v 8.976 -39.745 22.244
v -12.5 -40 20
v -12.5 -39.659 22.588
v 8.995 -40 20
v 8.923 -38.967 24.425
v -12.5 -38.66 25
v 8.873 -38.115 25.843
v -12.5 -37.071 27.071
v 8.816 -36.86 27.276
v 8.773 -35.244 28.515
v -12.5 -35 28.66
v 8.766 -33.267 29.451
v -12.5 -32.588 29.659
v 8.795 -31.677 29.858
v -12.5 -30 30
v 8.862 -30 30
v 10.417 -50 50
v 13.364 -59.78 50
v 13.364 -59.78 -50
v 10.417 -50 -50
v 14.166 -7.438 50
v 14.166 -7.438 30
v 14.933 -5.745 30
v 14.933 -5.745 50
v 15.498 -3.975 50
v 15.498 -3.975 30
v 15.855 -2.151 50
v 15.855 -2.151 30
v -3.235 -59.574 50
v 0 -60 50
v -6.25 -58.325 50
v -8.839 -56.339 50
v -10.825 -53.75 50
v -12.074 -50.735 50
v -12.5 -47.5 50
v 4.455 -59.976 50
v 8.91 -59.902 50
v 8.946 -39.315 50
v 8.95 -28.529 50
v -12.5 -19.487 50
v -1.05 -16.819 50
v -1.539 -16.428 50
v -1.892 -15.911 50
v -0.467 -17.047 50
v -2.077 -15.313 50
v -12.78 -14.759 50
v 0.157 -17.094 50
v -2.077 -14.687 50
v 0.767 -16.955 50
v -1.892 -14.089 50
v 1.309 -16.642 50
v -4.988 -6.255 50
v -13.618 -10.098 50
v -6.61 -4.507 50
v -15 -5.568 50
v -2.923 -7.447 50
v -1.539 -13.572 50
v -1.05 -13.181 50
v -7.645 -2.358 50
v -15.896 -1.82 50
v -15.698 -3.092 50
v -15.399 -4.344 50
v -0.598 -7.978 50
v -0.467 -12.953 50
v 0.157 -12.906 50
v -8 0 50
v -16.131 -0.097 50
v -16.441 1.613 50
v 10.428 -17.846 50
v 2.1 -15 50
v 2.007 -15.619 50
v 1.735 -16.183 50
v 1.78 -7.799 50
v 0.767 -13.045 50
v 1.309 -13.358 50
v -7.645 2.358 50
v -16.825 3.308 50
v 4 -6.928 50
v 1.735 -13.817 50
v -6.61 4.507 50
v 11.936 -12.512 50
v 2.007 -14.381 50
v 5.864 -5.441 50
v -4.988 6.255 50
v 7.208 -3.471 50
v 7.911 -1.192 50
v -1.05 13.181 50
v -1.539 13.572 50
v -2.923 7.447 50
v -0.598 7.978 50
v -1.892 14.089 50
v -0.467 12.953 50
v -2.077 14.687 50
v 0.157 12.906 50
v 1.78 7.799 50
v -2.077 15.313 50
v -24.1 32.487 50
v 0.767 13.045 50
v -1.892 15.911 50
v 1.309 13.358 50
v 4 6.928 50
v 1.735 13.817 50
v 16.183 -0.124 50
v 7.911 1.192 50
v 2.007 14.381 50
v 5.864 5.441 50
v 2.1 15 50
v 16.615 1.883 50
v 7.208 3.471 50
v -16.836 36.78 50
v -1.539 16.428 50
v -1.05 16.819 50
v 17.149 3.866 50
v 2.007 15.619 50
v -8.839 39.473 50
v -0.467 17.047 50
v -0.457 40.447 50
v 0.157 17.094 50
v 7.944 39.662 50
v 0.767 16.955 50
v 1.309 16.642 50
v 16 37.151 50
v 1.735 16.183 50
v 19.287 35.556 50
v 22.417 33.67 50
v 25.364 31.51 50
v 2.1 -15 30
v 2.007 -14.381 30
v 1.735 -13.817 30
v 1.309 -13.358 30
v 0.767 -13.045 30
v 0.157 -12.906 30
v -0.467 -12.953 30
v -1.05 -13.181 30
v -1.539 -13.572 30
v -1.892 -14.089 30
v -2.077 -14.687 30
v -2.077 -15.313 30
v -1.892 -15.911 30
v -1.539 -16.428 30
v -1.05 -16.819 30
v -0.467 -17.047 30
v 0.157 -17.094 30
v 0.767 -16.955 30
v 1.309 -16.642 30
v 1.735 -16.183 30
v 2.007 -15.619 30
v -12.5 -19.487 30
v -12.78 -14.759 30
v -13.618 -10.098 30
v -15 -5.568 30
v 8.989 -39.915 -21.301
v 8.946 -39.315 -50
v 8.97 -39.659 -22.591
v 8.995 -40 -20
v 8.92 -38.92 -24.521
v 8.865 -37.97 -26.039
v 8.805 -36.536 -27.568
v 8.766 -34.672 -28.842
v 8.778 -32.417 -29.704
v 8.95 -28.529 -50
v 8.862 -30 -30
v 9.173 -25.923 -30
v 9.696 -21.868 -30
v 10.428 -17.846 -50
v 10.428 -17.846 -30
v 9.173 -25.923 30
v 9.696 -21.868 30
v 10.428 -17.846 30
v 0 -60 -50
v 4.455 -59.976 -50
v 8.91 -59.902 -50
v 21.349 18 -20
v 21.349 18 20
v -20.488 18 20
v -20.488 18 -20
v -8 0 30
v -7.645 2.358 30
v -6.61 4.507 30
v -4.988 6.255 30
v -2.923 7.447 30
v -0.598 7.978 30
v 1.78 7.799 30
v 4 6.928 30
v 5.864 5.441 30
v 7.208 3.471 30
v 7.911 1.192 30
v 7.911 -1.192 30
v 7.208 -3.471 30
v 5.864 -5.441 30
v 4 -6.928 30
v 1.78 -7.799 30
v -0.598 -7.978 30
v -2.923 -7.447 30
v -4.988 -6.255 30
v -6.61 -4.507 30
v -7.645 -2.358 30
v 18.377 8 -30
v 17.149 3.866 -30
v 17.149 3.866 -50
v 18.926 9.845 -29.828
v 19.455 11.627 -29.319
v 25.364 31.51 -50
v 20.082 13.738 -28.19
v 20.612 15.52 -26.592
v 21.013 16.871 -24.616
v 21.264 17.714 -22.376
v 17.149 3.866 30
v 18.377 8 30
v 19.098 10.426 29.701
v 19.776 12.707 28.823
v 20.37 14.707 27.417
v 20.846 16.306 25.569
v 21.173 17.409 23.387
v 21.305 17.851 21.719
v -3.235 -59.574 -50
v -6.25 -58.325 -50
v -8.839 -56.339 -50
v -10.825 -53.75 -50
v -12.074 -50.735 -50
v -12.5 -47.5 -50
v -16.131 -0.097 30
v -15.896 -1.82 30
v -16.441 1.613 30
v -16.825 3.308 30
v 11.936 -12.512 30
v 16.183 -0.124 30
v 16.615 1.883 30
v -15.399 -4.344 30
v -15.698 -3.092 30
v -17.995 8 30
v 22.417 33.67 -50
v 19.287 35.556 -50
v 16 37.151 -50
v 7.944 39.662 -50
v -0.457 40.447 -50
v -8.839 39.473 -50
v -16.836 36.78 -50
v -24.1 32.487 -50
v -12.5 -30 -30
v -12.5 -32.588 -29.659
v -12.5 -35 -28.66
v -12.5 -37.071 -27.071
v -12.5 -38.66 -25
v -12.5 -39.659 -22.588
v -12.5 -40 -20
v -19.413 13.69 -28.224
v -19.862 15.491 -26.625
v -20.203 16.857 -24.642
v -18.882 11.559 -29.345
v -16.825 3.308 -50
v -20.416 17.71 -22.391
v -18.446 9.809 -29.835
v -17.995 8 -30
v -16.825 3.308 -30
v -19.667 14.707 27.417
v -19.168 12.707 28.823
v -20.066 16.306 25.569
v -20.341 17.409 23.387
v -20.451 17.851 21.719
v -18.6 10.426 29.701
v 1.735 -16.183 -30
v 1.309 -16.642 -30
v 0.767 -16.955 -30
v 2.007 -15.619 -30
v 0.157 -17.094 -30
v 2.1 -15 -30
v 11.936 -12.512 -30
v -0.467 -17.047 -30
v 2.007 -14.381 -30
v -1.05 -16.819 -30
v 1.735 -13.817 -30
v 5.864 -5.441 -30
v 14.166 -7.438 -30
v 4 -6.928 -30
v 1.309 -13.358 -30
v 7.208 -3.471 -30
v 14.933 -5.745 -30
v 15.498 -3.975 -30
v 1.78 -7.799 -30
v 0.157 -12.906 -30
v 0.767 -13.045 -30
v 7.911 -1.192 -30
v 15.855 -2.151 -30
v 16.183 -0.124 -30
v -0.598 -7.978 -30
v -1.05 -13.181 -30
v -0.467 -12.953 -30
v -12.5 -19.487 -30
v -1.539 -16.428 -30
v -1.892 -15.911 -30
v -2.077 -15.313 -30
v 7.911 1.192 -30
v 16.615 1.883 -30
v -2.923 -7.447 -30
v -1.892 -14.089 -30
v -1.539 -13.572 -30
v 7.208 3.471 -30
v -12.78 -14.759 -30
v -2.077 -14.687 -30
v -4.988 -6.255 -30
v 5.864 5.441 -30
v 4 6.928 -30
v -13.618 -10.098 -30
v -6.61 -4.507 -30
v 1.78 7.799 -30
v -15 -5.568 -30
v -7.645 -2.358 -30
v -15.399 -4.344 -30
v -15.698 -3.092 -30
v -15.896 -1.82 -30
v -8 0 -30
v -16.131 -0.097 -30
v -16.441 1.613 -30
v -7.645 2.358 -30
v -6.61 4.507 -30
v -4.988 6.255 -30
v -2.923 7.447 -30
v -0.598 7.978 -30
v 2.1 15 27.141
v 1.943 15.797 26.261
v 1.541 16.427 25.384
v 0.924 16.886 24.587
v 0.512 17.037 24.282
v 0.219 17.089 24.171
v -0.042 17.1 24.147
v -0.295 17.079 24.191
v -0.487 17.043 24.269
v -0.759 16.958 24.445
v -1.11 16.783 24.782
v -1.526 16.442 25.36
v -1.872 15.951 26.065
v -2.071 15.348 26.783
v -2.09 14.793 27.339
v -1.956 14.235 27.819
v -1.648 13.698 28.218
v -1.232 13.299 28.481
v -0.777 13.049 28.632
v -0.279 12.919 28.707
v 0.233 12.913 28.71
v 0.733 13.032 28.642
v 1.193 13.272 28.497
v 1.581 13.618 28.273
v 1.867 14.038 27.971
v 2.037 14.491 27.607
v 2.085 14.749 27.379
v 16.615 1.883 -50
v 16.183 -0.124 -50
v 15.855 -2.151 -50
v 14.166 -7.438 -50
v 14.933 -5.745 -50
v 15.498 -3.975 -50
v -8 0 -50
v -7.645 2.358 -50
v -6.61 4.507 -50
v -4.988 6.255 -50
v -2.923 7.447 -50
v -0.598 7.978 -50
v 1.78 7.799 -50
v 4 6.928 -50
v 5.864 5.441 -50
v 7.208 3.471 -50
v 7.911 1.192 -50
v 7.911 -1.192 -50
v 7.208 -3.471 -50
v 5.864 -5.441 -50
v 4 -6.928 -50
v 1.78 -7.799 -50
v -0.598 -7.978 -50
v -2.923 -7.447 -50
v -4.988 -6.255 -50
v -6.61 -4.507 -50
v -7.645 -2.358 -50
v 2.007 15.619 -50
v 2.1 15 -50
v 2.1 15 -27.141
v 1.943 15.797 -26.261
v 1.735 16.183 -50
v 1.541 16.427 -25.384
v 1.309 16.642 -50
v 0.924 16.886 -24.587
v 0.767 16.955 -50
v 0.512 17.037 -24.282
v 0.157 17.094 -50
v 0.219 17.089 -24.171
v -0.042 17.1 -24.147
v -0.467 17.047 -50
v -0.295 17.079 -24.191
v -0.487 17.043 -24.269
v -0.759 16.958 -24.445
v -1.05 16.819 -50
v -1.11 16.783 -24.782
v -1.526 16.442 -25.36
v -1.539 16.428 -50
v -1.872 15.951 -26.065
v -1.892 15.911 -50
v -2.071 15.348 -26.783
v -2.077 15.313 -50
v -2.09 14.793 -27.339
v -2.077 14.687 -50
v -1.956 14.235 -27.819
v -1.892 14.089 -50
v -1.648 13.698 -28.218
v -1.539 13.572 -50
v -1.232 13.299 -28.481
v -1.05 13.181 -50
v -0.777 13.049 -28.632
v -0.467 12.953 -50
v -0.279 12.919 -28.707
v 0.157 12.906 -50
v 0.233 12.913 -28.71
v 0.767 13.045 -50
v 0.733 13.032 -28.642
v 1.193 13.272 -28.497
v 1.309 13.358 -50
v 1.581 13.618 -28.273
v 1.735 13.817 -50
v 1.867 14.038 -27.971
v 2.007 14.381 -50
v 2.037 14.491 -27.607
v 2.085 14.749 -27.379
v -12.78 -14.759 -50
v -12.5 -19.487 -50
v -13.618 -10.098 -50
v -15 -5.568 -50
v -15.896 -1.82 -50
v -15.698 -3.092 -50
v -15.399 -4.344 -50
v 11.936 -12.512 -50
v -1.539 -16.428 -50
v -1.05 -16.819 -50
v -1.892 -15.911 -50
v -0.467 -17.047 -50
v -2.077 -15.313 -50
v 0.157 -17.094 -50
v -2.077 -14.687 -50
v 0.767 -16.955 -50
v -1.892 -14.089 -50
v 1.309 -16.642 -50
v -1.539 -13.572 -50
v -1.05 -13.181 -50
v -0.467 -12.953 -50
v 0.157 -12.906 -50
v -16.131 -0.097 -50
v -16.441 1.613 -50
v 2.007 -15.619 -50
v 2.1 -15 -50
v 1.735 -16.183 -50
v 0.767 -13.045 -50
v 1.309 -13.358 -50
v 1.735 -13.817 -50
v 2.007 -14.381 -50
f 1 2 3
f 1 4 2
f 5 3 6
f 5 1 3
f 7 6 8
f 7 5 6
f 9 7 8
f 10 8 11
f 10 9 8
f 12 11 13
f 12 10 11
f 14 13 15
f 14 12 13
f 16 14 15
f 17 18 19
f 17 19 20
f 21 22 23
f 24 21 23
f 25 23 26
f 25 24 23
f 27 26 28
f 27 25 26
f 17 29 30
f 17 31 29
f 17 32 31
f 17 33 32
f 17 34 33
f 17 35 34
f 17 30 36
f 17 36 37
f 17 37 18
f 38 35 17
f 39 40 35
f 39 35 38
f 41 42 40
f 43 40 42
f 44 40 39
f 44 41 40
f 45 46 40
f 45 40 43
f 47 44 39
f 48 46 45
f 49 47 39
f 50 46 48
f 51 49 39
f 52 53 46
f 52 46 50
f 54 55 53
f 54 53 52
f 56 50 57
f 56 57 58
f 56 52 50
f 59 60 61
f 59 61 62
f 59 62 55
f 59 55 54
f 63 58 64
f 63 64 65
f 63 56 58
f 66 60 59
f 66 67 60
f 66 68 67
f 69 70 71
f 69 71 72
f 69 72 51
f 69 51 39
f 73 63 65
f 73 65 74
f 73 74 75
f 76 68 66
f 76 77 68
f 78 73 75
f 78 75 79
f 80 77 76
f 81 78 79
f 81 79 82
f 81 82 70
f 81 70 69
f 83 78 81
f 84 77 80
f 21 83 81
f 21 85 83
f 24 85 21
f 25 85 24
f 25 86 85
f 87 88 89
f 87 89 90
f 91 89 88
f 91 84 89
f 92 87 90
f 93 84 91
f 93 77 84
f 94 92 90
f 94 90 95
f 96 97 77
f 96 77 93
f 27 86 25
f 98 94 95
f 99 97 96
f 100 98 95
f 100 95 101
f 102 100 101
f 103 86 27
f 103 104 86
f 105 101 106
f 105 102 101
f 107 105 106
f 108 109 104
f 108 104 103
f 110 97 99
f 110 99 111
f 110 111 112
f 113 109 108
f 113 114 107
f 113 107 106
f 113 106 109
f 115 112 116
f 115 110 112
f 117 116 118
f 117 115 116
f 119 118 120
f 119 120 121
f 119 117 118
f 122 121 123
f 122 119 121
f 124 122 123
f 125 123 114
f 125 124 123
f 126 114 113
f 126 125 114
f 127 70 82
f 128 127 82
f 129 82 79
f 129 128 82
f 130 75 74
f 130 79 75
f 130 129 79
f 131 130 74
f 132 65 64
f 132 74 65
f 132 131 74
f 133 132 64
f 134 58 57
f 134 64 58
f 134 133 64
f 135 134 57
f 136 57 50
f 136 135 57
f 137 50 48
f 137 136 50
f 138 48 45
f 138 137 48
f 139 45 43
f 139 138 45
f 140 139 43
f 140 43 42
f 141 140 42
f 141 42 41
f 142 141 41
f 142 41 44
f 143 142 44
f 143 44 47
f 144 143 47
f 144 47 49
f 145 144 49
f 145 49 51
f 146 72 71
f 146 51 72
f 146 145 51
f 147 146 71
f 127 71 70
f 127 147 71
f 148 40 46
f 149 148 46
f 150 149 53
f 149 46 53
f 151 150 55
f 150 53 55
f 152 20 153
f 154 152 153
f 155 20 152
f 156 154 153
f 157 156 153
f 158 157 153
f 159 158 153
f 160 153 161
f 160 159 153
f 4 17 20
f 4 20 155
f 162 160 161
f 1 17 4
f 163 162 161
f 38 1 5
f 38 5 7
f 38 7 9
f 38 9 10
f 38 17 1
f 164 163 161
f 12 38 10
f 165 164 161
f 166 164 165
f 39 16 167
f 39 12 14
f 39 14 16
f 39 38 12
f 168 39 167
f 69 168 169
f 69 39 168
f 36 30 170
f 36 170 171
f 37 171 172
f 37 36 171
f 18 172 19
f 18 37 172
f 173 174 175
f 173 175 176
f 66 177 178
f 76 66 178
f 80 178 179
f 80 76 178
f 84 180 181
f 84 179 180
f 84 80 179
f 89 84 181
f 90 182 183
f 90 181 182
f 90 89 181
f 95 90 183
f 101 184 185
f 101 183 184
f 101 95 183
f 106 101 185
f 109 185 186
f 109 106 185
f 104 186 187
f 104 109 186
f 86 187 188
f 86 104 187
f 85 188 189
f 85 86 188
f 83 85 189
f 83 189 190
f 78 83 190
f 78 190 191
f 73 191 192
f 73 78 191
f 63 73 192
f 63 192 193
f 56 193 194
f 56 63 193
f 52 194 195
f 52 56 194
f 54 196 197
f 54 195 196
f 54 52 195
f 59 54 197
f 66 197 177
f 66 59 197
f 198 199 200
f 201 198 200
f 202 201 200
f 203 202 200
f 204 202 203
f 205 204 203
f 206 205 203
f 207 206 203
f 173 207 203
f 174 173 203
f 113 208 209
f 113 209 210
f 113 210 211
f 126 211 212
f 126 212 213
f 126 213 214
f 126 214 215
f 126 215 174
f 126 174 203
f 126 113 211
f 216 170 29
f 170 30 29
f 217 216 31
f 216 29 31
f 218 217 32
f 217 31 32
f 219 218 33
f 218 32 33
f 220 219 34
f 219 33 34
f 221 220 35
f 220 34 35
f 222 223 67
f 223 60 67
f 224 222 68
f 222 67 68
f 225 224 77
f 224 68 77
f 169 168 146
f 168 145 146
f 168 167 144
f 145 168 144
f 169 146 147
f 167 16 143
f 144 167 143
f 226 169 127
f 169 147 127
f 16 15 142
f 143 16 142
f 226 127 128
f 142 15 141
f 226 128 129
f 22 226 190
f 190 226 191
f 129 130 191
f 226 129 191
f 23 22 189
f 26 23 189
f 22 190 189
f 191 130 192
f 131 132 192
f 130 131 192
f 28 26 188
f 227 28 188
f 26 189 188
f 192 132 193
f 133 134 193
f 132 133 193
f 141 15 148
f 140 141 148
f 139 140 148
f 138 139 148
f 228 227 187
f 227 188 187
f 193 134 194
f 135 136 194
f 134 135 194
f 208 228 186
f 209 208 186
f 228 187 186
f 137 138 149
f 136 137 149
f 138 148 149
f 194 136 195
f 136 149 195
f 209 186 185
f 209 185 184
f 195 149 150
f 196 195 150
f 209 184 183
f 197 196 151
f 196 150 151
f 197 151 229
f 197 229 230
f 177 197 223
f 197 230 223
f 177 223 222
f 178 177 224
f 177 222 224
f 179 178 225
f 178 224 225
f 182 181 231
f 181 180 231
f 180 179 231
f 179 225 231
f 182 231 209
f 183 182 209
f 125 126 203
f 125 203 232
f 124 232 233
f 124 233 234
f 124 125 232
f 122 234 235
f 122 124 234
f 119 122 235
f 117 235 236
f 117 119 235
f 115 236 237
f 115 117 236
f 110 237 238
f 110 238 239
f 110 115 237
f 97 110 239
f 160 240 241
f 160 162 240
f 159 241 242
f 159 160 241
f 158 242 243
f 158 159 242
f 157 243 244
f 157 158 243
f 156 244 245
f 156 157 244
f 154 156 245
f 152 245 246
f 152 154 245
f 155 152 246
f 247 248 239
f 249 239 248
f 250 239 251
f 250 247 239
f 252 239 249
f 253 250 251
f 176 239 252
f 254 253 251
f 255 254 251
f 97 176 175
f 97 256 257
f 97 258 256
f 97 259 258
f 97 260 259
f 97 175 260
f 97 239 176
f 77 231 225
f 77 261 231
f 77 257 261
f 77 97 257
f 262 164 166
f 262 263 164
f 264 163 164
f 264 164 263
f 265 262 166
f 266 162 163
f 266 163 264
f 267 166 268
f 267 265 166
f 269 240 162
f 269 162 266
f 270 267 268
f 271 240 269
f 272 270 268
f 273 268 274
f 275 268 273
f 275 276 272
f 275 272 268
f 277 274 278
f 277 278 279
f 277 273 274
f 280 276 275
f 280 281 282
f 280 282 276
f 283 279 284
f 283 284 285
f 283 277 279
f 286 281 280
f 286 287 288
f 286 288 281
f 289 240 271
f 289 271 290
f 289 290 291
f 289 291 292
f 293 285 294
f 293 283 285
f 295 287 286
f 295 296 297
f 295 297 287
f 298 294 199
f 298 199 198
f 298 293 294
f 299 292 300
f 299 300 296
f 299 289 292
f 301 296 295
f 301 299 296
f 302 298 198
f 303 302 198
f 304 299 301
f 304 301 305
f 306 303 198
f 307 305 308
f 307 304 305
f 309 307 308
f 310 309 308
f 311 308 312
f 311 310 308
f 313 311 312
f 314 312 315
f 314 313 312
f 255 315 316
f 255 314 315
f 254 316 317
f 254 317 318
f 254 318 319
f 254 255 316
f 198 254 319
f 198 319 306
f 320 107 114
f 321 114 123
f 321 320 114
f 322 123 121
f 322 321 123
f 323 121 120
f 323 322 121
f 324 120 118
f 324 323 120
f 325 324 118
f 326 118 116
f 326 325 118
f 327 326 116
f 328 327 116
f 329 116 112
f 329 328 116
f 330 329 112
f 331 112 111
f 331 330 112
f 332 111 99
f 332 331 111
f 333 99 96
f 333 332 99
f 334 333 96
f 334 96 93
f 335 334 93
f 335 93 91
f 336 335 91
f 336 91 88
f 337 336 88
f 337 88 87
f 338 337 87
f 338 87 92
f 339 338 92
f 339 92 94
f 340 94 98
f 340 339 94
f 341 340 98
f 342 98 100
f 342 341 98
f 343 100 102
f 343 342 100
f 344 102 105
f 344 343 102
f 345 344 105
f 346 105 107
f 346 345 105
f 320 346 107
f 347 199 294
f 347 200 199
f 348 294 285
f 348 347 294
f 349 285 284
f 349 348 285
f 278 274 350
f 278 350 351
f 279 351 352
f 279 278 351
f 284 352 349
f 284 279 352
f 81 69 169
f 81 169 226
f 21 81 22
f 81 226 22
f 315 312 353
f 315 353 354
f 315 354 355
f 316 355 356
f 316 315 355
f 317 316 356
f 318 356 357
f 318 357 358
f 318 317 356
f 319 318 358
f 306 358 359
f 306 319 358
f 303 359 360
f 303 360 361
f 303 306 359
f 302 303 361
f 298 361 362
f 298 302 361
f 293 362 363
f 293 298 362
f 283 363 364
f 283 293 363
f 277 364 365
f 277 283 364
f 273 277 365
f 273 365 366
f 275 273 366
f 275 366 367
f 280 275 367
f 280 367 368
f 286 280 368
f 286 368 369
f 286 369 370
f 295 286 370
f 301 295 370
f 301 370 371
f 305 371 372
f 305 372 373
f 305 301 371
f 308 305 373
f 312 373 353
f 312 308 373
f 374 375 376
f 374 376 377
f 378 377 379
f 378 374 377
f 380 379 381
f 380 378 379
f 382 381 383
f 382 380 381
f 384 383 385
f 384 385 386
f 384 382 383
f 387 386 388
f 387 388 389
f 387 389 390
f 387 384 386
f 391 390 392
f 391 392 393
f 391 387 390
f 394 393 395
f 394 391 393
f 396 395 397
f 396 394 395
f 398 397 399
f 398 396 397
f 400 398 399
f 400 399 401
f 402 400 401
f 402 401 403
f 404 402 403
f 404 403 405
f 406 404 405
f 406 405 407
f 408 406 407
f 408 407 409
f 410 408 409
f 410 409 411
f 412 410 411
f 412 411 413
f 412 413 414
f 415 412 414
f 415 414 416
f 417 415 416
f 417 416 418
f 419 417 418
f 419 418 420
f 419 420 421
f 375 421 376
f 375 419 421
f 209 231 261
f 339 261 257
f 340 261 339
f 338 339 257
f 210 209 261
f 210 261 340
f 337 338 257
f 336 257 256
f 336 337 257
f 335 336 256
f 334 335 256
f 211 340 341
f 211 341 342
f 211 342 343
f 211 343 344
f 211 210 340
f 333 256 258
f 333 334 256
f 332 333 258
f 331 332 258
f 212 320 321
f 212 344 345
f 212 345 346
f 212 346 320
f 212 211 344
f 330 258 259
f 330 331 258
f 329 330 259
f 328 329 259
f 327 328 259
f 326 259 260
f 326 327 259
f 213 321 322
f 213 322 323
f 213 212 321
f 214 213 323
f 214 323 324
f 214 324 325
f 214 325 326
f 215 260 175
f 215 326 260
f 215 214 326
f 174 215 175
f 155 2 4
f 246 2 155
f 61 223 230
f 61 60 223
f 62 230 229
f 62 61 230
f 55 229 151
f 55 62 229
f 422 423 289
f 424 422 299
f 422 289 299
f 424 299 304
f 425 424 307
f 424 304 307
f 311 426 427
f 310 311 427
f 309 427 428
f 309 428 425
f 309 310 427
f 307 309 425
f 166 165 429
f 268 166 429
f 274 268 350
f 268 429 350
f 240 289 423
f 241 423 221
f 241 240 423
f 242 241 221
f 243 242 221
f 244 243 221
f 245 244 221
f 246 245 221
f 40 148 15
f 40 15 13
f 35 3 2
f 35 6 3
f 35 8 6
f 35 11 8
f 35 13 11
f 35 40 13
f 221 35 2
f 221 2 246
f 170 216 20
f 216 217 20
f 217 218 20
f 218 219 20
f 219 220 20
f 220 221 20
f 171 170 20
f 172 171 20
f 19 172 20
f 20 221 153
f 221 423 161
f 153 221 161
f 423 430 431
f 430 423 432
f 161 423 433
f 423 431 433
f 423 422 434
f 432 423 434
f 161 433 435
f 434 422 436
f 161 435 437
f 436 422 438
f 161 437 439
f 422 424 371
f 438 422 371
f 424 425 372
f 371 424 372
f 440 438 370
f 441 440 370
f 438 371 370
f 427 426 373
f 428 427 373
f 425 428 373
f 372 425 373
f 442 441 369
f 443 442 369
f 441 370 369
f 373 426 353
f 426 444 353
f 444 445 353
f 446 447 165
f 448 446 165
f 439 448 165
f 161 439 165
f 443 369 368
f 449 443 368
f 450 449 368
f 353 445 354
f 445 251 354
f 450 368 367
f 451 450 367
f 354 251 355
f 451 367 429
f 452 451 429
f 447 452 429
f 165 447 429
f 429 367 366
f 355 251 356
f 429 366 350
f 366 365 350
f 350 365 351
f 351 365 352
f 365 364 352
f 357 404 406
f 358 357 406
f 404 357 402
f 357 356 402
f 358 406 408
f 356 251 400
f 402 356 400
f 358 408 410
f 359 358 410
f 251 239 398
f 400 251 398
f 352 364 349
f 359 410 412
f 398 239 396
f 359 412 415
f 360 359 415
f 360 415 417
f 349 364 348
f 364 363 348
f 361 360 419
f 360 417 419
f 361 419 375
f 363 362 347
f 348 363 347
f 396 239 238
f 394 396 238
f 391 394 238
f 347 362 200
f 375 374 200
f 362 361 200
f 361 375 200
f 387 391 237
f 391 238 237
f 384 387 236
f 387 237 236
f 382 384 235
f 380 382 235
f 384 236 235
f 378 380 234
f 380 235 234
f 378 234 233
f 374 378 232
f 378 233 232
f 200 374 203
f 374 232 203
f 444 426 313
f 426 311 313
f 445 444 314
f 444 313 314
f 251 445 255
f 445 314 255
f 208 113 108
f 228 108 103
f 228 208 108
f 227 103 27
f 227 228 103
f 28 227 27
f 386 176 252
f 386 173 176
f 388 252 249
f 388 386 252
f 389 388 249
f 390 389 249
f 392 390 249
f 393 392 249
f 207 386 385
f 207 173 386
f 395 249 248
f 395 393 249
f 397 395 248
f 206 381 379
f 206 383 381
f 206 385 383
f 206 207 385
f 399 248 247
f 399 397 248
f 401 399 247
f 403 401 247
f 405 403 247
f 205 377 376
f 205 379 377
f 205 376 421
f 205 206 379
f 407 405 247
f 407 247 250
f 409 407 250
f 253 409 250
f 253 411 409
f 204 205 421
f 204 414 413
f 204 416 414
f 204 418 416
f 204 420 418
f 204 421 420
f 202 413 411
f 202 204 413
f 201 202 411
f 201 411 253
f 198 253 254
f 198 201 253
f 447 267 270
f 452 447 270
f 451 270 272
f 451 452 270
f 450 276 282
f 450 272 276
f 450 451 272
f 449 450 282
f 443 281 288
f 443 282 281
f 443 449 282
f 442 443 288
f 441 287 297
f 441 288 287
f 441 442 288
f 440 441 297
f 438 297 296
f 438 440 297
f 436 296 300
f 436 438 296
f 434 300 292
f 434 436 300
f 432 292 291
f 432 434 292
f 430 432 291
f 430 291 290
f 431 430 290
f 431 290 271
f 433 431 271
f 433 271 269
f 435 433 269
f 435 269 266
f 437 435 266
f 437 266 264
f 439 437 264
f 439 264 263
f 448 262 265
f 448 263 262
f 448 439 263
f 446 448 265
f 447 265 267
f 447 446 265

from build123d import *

# Parameters (mm, degrees)
BOSS_EXTRUDE1_DEPTH     = 50
FILLET1_R               = 12.5
FILLET2_R               = 40
CUT_EXTRUDE1_DEPTH      = 80.72452587
CUT_EXTRUDE1_DEPTH_BACK = 80.72452587
SKETCH7_W               = 60
SKETCH7_H               = 40
FILLET3_R               = 10
BOSS_EXTRUDE2_DEPTH     = 50
FILLET5_R               = 40
CUT_EXTRUDE2_DEPTH      = 83.117686393
CUT_EXTRUDE2_DEPTH_BACK = 83.117686393
SKETCH9_W               = 60
SKETCH9_H               = 18
FILLET4_R               = 10
CUT_EXTRUDE3_DEPTH      = 120.345357801
CUT_EXTRUDE3_DEPTH_BACK = 120.345357801
SKETCH10_R              = 2.1


with BuildPart() as part:
    # Sketch4 → Boss-Extrude1 (new, symmetric)
    with BuildSketch(Plane.XY):
        with BuildLine():
            ThreePointArc((8, 0), (0, -8), (-8, 0))
            Line((-8, 0), (-16, 0))
            ThreePointArc((-16, 0), (-15.099668871, -5.291502622), (-12.5, -9.987492178))
            Line((-12.5, -9.987492178), (-12.5, -58.683472972))
            ThreePointArc((-12.5, -58.683472972), (-6.284569266, -59.669960526), (0, -60))
            ThreePointArc((0, -60), (6.682717176, -59.945089422), (13.363629715, -59.780372517))
            Line((13.363629715, -59.780372517), (10.416666667, -50))
            ThreePointArc((10.416666667, -50), (8.869060232, -29.858930271), (12.5, -9.987492178))
            ThreePointArc((12.5, -9.987492178), (15.099668871, -5.291502622), (16, 0))
            Line((16, 0), (8, 0))
        make_face()
    extrude(amount=BOSS_EXTRUDE1_DEPTH, both=True)

    # Fillet1
    fillet1_edges = [part.edges().sort_by_distance(p)[0] for p in [
        (-12.5, -58.683472972, 0),
    ]]
    fillet(fillet1_edges, radius=FILLET1_R - 0.0001)  # a hair under: the kernel refuses the full size

    # Fillet2
    fillet2_edges = [part.edges().sort_by_distance(p)[0] for p in [
        (-12.5, -9.987492178, 0),
        (12.5, -9.987492178, 0),
    ]]
    fillet(fillet2_edges, radius=FILLET2_R)

    # Sketch7 → Cut-Extrude1 (cut, two sides: drawn at the far end of the back side and taken through both)
    with BuildSketch(Plane(origin=(0, 0, 0), x_dir=(0, 0, -1), z_dir=(1, 0, 0)).offset(-CUT_EXTRUDE1_DEPTH_BACK)):
        with Locations((0, -20)):
            Rectangle(SKETCH7_W, SKETCH7_H)
    extrude(amount=CUT_EXTRUDE1_DEPTH + CUT_EXTRUDE1_DEPTH_BACK, mode=Mode.SUBTRACT)

    # Fillet3
    fillet3_edges = [part.edges().sort_by_distance(p)[0] for p in [
        (-1.752259827, -40, -30),
        (-1.752259827, -40, 30),
    ]]
    fillet(fillet3_edges, radius=FILLET3_R)

    # Sketch8 → Boss-Extrude2 (add, symmetric)
    with BuildSketch(Plane.XY):
        with BuildLine():
            Line((8, 0), (16, 0))
            ThreePointArc((16, 0), (0, 16), (-16, 0))
            Line((-16, 0), (-8, 0))
            ThreePointArc((-8, 0), (0, 8), (8, 0))
        make_face()
        with BuildLine():
            ThreePointArc((-16, 0), (0, 16), (16, 0))
            Line((16, 0), (16, 37.1510767))
            ThreePointArc((16, 37.1510767), (-4.673406093, 40.179121139), (-24.099890471, 32.486886266))
            Line((-24.099890471, 32.486886266), (-16, 0))
        make_face()
        with BuildLine():
            Line((16, 37.1510767), (16, 0))
            Line((16, 0), (25.363643105, 31.510127078))
            ThreePointArc((25.363643105, 31.510127078), (20.873256116, 34.648371955), (16, 37.1510767))
        make_face()
    extrude(amount=BOSS_EXTRUDE2_DEPTH, both=True)

    # Fillet5
    fillet5_edges = [part.edges().sort_by_distance(p)[0] for p in [
        (-16, 0, 40),
        (16, 0, 40),
        (-16, 0, -40),
        (16, 0, -40),
    ]]
    fillet(fillet5_edges, radius=FILLET5_R)

    # Sketch9 → Cut-Extrude2 (cut, two sides: drawn at the far end of the back side and taken through both)
    with BuildSketch(Plane(origin=(0, 0, 0), x_dir=(0, 0, -1), z_dir=(1, 0, 0)).offset(-CUT_EXTRUDE2_DEPTH_BACK)):
        with Locations((0, 9)):
            Rectangle(SKETCH9_W, SKETCH9_H)
    extrude(amount=CUT_EXTRUDE2_DEPTH + CUT_EXTRUDE2_DEPTH_BACK, mode=Mode.SUBTRACT)

    # Fillet4
    fillet4_edges = [part.edges().sort_by_distance(p)[0] for p in [
        (0.430514749, 18, 30),
        (0.430514749, 18, -30),
    ]]
    fillet(fillet4_edges, radius=FILLET4_R - 0.0001)  # a hair under: the kernel refuses the full size

    # Sketch10 → Cut-Extrude3 (cut, two sides: drawn at the far end of the back side and taken through both)
    with BuildSketch(Plane.XY.offset(50).offset(-CUT_EXTRUDE3_DEPTH_BACK)):
        with Locations((0, 15)):
            Circle(SKETCH10_R)
        with Locations((0, -15)):
            Circle(SKETCH10_R)
    extrude(amount=CUT_EXTRUDE3_DEPTH + CUT_EXTRUDE3_DEPTH_BACK, mode=Mode.SUBTRACT)


solid = part.part
